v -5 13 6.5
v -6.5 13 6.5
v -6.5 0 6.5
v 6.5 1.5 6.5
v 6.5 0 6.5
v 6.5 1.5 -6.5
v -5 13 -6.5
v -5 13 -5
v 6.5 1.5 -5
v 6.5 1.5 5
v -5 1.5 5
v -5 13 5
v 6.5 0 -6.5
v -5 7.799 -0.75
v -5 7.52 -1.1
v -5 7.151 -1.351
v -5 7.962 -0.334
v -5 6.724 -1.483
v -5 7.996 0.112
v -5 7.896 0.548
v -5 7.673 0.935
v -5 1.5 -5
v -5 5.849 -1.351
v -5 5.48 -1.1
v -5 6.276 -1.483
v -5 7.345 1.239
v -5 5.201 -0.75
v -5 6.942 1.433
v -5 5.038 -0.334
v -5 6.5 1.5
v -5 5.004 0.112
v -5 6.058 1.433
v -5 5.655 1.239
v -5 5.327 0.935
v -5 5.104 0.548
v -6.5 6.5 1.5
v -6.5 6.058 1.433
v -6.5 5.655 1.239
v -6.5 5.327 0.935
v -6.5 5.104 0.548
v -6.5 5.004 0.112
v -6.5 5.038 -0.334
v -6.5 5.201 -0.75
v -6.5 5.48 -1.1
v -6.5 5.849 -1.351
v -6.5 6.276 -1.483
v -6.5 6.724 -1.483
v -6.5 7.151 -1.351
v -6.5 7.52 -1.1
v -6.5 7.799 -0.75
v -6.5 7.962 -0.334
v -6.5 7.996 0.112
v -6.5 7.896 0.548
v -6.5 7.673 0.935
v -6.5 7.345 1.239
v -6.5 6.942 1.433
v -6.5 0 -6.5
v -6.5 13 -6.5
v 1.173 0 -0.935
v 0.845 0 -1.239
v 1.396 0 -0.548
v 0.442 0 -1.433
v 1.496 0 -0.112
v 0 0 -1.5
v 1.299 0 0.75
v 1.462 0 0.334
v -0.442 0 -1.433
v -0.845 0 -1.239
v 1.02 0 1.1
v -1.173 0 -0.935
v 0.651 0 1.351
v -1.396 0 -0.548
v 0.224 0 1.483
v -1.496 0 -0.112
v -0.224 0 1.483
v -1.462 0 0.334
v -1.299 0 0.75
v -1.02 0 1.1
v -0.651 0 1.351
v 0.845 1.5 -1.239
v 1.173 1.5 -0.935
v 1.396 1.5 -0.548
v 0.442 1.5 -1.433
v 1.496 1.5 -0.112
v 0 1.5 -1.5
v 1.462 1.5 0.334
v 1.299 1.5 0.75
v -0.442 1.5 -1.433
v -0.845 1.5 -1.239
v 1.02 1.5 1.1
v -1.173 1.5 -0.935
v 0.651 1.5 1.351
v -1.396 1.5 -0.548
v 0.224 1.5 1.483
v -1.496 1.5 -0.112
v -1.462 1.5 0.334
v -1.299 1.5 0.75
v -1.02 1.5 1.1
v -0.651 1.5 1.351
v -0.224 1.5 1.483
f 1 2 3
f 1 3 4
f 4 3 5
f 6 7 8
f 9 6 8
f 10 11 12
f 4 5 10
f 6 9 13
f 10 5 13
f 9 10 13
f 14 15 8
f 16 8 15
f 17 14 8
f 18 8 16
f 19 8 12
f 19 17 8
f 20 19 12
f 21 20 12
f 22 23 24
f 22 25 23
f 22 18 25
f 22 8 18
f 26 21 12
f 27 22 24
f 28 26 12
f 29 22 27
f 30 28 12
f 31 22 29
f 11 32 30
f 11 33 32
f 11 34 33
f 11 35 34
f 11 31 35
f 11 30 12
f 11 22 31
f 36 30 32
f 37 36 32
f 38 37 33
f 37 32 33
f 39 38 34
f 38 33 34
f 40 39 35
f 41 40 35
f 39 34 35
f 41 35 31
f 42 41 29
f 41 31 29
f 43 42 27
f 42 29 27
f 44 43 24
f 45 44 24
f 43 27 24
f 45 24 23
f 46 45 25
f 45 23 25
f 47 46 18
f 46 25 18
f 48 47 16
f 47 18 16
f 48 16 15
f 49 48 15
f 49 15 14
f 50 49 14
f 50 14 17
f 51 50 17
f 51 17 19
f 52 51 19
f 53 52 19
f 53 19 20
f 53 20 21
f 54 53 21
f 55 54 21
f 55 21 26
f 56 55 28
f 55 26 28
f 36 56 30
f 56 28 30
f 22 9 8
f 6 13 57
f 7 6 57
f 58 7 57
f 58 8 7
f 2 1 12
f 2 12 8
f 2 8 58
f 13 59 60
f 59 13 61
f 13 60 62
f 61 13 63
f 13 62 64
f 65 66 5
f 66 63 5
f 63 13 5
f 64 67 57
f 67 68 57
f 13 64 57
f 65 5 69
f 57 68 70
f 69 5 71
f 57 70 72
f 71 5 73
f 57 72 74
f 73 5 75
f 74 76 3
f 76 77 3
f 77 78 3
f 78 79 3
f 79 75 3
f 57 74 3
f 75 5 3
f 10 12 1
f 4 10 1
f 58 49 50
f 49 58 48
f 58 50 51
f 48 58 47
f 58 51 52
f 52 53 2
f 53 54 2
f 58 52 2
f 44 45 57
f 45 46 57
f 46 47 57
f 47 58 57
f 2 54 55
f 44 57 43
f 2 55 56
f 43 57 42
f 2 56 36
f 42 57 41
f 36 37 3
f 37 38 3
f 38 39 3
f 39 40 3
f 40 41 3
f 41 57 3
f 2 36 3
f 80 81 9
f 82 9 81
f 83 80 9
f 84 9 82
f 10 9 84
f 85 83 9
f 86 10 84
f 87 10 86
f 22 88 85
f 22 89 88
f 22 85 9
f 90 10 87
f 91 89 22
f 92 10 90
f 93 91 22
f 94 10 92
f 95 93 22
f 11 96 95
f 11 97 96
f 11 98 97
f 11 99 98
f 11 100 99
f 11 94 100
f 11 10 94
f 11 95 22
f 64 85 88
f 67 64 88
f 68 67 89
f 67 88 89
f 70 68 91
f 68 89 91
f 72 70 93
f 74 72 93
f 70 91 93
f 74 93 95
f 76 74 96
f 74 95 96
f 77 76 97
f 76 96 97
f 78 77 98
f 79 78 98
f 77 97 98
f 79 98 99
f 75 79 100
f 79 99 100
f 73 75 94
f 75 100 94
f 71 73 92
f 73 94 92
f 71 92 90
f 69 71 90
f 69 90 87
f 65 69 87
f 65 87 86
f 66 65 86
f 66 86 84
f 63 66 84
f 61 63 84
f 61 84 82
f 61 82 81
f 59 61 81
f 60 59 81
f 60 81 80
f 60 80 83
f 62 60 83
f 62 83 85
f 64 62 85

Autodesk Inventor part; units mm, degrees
ref_plane "YZ Plane" through (0, 0, 0) normal (1, 0, 0) x (0, 1, 0)
ref_plane "XZ Plane" through (0, 0, 0) normal (0, 1, 0) x (-1, 0, 0)
ref_plane "XY Plane" through (0, 0, 0) normal (0, 0, 1) x (1, 0, 0)
sketch "Boceto1" plane through (0, 0, 0) normal (0, 1, 0) x (-1, 0, 0)
  line L0 (-6.5, -6.5) -> (6.5, -6.5)
  line L1 (6.5, -6.5) -> (6.5, 6.5)
  line L2 (6.5, 6.5) -> (-6.5, 6.5)
  line L3 (-6.5, 6.5) -> (-6.5, -6.5)
  line L4 (-6.5, -6.5) -> (6.5, 6.5) construction
  line L5 (6.5, -6.5) -> (-6.5, 6.5) construction
  point P0 (0, 0)
  dimension "d0" = 13
  dimension "d1" = 13
extrude "Extrusión1" add sketch "Boceto1" along normal blind 13
shell "Vaciado1" thickness 1.5 removed faces 2 at (6.5, 4.3333, 2.1667) at (-2.1667, 13, -2.1667)
chamfer "Chaflán1" distance 11.5 angle 45 2 edges at (6.5, 13, 5.75) (6.5, 13, -5.75)
sketch "Boceto2" plane through (0, 0, 0) normal (0, -1, 0) x (1, 0, 0)
  line L0 (-6.5, 6.5) -> (6.5, 6.5) projected
  line L1 (-6.5, -6.5) -> (-6.5, 6.5) projected
  point P0 (0, 0)
  point P1 (0, 0)
  dimension "d8" = 6.5
  dimension "d9" = 6.5
hole "Agujero1" at (0, 0, 0) direction (0, 1, 0) diameter 3 depth 3 tip angle 118
sketch "Boceto3" plane through (-6.5, 0, -6.5) normal (-1, 0, 0) x (0, 0, 1)
  line L0 (0, 0) -> (13, 0) projected
  line L1 (13, 0) -> (13, 13) projected
  point P0 (6.5, 0)
  point P1 (6.5, 6.5)
  dimension "d17" = 6.5
  dimension "d18" = 6.5
hole "Agujero2" at (-6.5, 6.5, 0) direction (1, 0, 0) diameter 3 depth 3 tip angle 118
properties part number "Escuadra"
